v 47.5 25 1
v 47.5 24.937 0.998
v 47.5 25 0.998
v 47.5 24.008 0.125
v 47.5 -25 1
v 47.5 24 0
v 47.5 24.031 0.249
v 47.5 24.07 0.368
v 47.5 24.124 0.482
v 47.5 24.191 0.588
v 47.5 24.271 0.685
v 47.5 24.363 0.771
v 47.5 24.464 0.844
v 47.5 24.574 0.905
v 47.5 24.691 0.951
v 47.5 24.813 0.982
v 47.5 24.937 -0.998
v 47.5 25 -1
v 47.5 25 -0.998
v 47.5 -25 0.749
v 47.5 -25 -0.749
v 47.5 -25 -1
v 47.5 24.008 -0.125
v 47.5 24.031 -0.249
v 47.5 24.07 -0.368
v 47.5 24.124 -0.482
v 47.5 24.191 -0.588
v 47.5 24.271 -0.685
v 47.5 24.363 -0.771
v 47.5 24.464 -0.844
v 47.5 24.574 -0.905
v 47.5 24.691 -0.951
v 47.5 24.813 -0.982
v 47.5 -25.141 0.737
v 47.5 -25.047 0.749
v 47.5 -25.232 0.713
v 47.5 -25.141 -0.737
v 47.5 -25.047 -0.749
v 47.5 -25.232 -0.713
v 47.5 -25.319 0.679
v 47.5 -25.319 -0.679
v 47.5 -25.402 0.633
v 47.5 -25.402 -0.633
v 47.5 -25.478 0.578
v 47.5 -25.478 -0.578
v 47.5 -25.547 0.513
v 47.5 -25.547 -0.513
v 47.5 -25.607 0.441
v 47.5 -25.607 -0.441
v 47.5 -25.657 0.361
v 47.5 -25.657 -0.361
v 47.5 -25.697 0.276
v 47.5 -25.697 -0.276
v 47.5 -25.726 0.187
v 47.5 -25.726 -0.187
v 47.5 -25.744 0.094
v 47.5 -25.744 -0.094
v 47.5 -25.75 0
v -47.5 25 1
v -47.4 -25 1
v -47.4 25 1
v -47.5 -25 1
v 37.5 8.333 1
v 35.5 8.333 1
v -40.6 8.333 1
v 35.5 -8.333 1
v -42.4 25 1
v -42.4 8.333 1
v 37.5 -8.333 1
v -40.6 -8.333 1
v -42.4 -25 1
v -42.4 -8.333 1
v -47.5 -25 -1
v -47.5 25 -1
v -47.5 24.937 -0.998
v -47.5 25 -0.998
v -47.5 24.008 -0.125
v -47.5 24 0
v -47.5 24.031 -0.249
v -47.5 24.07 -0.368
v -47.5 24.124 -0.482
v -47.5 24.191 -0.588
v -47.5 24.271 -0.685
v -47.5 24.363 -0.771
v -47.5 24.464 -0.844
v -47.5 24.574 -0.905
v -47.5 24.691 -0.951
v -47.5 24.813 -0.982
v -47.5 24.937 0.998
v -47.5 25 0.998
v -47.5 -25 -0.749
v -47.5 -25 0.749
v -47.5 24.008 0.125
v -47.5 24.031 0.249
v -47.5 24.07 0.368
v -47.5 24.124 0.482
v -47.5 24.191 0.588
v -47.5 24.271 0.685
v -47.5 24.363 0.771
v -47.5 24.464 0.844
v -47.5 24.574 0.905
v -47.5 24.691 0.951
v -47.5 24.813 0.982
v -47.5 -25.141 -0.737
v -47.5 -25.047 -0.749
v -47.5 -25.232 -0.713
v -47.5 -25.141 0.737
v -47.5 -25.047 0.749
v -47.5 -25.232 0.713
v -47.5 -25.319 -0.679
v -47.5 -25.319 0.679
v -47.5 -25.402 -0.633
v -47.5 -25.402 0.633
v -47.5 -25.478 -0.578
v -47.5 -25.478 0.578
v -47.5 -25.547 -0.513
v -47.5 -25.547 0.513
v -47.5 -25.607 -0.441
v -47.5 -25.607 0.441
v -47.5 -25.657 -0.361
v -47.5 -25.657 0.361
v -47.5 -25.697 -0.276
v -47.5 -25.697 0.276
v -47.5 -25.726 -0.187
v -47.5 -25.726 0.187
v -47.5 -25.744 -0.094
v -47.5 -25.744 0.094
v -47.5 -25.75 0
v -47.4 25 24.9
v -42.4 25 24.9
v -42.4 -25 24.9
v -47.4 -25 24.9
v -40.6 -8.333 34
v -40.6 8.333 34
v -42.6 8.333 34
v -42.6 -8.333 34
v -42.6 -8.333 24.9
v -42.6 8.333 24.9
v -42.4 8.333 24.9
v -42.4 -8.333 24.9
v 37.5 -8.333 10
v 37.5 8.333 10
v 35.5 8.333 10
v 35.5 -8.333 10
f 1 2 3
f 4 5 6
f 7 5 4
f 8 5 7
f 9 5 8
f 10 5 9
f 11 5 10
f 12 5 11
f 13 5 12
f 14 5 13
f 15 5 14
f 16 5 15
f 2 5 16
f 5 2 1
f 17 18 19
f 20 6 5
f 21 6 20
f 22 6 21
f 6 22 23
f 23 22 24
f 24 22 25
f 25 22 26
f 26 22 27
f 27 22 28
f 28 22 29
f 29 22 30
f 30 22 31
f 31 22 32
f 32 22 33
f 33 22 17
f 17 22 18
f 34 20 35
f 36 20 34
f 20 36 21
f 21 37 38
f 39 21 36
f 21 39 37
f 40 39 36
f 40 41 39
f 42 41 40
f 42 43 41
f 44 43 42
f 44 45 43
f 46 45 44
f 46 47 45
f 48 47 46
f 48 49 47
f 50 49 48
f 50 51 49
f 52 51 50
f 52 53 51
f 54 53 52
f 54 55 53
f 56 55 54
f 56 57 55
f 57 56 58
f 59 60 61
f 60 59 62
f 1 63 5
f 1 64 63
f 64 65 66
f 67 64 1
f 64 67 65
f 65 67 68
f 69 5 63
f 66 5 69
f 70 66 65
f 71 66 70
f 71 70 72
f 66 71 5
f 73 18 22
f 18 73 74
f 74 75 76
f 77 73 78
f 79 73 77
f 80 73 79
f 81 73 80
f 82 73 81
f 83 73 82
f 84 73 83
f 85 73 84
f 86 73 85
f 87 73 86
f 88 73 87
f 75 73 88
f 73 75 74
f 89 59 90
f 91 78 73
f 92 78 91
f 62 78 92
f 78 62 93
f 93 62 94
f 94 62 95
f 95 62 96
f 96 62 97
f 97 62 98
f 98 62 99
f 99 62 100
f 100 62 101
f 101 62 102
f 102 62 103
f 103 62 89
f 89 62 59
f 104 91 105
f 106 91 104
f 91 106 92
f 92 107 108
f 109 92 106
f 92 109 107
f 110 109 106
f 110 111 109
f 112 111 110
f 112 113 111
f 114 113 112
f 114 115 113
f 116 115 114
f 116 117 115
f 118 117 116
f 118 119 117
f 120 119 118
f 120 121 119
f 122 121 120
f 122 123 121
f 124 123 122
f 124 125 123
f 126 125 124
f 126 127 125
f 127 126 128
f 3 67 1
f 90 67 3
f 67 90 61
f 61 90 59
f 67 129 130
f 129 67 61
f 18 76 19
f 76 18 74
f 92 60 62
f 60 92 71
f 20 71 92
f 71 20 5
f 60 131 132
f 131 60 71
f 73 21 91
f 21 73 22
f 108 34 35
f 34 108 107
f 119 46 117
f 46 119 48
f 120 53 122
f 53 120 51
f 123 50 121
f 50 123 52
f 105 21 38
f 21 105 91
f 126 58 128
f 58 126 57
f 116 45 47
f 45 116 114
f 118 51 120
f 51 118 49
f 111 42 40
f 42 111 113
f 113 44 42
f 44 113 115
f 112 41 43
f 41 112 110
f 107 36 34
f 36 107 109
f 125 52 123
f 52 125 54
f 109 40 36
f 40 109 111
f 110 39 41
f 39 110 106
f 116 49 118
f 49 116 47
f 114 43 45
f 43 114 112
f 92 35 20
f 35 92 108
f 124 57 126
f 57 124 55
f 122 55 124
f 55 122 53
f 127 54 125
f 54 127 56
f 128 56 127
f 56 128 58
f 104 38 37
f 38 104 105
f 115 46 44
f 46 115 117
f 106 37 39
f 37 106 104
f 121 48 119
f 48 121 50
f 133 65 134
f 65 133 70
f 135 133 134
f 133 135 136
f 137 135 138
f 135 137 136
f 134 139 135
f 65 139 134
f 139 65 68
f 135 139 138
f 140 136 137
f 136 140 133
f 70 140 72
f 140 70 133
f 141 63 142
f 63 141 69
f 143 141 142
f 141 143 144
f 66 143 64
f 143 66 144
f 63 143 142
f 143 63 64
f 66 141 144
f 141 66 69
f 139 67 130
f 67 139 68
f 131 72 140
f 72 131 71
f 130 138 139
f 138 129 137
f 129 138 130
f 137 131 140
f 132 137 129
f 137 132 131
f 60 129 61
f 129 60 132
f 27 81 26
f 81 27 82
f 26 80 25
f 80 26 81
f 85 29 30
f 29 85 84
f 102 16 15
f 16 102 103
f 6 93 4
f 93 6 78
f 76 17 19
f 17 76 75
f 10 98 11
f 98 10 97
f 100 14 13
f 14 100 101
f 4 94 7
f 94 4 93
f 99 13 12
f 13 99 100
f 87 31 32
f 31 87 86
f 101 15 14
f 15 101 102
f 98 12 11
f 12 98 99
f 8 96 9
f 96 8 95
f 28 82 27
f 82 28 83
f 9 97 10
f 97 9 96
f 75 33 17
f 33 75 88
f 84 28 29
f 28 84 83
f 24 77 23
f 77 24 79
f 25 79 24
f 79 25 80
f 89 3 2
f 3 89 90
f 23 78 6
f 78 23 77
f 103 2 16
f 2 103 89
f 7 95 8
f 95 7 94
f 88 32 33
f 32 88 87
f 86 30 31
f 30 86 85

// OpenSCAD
$fn = 50;

sizeX = 95;
sizeY = 50;
errorCorrectLenght=24;
errorCorrectAngle=0;




difference(){
        body();
        color("RED") translate([0,sizeY/2,0]) rotate([90,0,90]) cylinder(h=sizeX, d=2, center=true);
        if(errorCorrectAngle < 0){
           color("PURPLE") 
        translate([-sizeX/2+5+1,-sizeY/2,errorCorrectLenght+1])
        rotate([180,90,0]) 
        triangle(errorCorrectAngle,errorCorrectLenght,6, false);
        }
    }


module body() {
    color("GREEN") cube([sizeX,sizeY,2], center =true);   
    color("RED") translate([0,-sizeY/2,0]) rotate([90,0,90]) cylinder(h=sizeX, d=1.5, center=true);
    color("BLUE") translate([-sizeX/2+1+5-0.1,0,(errorCorrectLenght+10)/2]) cube([2,sizeY/3,errorCorrectLenght+10], center = true);
    color("YELLOW") translate([sizeX/2-1-10,0,5]) cube([2,sizeY/3,10], center = true);
    if (errorCorrectLenght>0){
        color("PINK") translate([-sizeX/2+2.6,0,errorCorrectLenght/2+0.9]) cube([5,sizeY,errorCorrectLenght], center = true);
    }
    if (errorCorrectAngle>0){
       color("PURPLE") 
        translate([-sizeX/2+5,-sizeY/2+0.1,errorCorrectLenght+1])
        rotate([180,90,0]) 
        triangle(errorCorrectAngle,errorCorrectLenght,5, false);
        
    }
}


    
/**
 * Standard right-angled triangle
 *
 * @param number  o_len  Length of the opposite side
 * @param number  a_len  Length of the adjacent side
 * @param number  depth  How wide/deep the triangle is in the 3rd dimension
 * @param boolean center Whether to center the triangle on the origin
 * @todo a better way ?
 */
module triangle(o_len, a_len, depth, center=false)
{
    centroid = center ? [-a_len/3, -o_len/3, -depth/2] : [0, 0, 0];
    translate(centroid) linear_extrude(height=depth)
    {
        polygon(points=[[0,0],[a_len,0],[0,o_len]], paths=[[0,1,2]]);
    }
}
